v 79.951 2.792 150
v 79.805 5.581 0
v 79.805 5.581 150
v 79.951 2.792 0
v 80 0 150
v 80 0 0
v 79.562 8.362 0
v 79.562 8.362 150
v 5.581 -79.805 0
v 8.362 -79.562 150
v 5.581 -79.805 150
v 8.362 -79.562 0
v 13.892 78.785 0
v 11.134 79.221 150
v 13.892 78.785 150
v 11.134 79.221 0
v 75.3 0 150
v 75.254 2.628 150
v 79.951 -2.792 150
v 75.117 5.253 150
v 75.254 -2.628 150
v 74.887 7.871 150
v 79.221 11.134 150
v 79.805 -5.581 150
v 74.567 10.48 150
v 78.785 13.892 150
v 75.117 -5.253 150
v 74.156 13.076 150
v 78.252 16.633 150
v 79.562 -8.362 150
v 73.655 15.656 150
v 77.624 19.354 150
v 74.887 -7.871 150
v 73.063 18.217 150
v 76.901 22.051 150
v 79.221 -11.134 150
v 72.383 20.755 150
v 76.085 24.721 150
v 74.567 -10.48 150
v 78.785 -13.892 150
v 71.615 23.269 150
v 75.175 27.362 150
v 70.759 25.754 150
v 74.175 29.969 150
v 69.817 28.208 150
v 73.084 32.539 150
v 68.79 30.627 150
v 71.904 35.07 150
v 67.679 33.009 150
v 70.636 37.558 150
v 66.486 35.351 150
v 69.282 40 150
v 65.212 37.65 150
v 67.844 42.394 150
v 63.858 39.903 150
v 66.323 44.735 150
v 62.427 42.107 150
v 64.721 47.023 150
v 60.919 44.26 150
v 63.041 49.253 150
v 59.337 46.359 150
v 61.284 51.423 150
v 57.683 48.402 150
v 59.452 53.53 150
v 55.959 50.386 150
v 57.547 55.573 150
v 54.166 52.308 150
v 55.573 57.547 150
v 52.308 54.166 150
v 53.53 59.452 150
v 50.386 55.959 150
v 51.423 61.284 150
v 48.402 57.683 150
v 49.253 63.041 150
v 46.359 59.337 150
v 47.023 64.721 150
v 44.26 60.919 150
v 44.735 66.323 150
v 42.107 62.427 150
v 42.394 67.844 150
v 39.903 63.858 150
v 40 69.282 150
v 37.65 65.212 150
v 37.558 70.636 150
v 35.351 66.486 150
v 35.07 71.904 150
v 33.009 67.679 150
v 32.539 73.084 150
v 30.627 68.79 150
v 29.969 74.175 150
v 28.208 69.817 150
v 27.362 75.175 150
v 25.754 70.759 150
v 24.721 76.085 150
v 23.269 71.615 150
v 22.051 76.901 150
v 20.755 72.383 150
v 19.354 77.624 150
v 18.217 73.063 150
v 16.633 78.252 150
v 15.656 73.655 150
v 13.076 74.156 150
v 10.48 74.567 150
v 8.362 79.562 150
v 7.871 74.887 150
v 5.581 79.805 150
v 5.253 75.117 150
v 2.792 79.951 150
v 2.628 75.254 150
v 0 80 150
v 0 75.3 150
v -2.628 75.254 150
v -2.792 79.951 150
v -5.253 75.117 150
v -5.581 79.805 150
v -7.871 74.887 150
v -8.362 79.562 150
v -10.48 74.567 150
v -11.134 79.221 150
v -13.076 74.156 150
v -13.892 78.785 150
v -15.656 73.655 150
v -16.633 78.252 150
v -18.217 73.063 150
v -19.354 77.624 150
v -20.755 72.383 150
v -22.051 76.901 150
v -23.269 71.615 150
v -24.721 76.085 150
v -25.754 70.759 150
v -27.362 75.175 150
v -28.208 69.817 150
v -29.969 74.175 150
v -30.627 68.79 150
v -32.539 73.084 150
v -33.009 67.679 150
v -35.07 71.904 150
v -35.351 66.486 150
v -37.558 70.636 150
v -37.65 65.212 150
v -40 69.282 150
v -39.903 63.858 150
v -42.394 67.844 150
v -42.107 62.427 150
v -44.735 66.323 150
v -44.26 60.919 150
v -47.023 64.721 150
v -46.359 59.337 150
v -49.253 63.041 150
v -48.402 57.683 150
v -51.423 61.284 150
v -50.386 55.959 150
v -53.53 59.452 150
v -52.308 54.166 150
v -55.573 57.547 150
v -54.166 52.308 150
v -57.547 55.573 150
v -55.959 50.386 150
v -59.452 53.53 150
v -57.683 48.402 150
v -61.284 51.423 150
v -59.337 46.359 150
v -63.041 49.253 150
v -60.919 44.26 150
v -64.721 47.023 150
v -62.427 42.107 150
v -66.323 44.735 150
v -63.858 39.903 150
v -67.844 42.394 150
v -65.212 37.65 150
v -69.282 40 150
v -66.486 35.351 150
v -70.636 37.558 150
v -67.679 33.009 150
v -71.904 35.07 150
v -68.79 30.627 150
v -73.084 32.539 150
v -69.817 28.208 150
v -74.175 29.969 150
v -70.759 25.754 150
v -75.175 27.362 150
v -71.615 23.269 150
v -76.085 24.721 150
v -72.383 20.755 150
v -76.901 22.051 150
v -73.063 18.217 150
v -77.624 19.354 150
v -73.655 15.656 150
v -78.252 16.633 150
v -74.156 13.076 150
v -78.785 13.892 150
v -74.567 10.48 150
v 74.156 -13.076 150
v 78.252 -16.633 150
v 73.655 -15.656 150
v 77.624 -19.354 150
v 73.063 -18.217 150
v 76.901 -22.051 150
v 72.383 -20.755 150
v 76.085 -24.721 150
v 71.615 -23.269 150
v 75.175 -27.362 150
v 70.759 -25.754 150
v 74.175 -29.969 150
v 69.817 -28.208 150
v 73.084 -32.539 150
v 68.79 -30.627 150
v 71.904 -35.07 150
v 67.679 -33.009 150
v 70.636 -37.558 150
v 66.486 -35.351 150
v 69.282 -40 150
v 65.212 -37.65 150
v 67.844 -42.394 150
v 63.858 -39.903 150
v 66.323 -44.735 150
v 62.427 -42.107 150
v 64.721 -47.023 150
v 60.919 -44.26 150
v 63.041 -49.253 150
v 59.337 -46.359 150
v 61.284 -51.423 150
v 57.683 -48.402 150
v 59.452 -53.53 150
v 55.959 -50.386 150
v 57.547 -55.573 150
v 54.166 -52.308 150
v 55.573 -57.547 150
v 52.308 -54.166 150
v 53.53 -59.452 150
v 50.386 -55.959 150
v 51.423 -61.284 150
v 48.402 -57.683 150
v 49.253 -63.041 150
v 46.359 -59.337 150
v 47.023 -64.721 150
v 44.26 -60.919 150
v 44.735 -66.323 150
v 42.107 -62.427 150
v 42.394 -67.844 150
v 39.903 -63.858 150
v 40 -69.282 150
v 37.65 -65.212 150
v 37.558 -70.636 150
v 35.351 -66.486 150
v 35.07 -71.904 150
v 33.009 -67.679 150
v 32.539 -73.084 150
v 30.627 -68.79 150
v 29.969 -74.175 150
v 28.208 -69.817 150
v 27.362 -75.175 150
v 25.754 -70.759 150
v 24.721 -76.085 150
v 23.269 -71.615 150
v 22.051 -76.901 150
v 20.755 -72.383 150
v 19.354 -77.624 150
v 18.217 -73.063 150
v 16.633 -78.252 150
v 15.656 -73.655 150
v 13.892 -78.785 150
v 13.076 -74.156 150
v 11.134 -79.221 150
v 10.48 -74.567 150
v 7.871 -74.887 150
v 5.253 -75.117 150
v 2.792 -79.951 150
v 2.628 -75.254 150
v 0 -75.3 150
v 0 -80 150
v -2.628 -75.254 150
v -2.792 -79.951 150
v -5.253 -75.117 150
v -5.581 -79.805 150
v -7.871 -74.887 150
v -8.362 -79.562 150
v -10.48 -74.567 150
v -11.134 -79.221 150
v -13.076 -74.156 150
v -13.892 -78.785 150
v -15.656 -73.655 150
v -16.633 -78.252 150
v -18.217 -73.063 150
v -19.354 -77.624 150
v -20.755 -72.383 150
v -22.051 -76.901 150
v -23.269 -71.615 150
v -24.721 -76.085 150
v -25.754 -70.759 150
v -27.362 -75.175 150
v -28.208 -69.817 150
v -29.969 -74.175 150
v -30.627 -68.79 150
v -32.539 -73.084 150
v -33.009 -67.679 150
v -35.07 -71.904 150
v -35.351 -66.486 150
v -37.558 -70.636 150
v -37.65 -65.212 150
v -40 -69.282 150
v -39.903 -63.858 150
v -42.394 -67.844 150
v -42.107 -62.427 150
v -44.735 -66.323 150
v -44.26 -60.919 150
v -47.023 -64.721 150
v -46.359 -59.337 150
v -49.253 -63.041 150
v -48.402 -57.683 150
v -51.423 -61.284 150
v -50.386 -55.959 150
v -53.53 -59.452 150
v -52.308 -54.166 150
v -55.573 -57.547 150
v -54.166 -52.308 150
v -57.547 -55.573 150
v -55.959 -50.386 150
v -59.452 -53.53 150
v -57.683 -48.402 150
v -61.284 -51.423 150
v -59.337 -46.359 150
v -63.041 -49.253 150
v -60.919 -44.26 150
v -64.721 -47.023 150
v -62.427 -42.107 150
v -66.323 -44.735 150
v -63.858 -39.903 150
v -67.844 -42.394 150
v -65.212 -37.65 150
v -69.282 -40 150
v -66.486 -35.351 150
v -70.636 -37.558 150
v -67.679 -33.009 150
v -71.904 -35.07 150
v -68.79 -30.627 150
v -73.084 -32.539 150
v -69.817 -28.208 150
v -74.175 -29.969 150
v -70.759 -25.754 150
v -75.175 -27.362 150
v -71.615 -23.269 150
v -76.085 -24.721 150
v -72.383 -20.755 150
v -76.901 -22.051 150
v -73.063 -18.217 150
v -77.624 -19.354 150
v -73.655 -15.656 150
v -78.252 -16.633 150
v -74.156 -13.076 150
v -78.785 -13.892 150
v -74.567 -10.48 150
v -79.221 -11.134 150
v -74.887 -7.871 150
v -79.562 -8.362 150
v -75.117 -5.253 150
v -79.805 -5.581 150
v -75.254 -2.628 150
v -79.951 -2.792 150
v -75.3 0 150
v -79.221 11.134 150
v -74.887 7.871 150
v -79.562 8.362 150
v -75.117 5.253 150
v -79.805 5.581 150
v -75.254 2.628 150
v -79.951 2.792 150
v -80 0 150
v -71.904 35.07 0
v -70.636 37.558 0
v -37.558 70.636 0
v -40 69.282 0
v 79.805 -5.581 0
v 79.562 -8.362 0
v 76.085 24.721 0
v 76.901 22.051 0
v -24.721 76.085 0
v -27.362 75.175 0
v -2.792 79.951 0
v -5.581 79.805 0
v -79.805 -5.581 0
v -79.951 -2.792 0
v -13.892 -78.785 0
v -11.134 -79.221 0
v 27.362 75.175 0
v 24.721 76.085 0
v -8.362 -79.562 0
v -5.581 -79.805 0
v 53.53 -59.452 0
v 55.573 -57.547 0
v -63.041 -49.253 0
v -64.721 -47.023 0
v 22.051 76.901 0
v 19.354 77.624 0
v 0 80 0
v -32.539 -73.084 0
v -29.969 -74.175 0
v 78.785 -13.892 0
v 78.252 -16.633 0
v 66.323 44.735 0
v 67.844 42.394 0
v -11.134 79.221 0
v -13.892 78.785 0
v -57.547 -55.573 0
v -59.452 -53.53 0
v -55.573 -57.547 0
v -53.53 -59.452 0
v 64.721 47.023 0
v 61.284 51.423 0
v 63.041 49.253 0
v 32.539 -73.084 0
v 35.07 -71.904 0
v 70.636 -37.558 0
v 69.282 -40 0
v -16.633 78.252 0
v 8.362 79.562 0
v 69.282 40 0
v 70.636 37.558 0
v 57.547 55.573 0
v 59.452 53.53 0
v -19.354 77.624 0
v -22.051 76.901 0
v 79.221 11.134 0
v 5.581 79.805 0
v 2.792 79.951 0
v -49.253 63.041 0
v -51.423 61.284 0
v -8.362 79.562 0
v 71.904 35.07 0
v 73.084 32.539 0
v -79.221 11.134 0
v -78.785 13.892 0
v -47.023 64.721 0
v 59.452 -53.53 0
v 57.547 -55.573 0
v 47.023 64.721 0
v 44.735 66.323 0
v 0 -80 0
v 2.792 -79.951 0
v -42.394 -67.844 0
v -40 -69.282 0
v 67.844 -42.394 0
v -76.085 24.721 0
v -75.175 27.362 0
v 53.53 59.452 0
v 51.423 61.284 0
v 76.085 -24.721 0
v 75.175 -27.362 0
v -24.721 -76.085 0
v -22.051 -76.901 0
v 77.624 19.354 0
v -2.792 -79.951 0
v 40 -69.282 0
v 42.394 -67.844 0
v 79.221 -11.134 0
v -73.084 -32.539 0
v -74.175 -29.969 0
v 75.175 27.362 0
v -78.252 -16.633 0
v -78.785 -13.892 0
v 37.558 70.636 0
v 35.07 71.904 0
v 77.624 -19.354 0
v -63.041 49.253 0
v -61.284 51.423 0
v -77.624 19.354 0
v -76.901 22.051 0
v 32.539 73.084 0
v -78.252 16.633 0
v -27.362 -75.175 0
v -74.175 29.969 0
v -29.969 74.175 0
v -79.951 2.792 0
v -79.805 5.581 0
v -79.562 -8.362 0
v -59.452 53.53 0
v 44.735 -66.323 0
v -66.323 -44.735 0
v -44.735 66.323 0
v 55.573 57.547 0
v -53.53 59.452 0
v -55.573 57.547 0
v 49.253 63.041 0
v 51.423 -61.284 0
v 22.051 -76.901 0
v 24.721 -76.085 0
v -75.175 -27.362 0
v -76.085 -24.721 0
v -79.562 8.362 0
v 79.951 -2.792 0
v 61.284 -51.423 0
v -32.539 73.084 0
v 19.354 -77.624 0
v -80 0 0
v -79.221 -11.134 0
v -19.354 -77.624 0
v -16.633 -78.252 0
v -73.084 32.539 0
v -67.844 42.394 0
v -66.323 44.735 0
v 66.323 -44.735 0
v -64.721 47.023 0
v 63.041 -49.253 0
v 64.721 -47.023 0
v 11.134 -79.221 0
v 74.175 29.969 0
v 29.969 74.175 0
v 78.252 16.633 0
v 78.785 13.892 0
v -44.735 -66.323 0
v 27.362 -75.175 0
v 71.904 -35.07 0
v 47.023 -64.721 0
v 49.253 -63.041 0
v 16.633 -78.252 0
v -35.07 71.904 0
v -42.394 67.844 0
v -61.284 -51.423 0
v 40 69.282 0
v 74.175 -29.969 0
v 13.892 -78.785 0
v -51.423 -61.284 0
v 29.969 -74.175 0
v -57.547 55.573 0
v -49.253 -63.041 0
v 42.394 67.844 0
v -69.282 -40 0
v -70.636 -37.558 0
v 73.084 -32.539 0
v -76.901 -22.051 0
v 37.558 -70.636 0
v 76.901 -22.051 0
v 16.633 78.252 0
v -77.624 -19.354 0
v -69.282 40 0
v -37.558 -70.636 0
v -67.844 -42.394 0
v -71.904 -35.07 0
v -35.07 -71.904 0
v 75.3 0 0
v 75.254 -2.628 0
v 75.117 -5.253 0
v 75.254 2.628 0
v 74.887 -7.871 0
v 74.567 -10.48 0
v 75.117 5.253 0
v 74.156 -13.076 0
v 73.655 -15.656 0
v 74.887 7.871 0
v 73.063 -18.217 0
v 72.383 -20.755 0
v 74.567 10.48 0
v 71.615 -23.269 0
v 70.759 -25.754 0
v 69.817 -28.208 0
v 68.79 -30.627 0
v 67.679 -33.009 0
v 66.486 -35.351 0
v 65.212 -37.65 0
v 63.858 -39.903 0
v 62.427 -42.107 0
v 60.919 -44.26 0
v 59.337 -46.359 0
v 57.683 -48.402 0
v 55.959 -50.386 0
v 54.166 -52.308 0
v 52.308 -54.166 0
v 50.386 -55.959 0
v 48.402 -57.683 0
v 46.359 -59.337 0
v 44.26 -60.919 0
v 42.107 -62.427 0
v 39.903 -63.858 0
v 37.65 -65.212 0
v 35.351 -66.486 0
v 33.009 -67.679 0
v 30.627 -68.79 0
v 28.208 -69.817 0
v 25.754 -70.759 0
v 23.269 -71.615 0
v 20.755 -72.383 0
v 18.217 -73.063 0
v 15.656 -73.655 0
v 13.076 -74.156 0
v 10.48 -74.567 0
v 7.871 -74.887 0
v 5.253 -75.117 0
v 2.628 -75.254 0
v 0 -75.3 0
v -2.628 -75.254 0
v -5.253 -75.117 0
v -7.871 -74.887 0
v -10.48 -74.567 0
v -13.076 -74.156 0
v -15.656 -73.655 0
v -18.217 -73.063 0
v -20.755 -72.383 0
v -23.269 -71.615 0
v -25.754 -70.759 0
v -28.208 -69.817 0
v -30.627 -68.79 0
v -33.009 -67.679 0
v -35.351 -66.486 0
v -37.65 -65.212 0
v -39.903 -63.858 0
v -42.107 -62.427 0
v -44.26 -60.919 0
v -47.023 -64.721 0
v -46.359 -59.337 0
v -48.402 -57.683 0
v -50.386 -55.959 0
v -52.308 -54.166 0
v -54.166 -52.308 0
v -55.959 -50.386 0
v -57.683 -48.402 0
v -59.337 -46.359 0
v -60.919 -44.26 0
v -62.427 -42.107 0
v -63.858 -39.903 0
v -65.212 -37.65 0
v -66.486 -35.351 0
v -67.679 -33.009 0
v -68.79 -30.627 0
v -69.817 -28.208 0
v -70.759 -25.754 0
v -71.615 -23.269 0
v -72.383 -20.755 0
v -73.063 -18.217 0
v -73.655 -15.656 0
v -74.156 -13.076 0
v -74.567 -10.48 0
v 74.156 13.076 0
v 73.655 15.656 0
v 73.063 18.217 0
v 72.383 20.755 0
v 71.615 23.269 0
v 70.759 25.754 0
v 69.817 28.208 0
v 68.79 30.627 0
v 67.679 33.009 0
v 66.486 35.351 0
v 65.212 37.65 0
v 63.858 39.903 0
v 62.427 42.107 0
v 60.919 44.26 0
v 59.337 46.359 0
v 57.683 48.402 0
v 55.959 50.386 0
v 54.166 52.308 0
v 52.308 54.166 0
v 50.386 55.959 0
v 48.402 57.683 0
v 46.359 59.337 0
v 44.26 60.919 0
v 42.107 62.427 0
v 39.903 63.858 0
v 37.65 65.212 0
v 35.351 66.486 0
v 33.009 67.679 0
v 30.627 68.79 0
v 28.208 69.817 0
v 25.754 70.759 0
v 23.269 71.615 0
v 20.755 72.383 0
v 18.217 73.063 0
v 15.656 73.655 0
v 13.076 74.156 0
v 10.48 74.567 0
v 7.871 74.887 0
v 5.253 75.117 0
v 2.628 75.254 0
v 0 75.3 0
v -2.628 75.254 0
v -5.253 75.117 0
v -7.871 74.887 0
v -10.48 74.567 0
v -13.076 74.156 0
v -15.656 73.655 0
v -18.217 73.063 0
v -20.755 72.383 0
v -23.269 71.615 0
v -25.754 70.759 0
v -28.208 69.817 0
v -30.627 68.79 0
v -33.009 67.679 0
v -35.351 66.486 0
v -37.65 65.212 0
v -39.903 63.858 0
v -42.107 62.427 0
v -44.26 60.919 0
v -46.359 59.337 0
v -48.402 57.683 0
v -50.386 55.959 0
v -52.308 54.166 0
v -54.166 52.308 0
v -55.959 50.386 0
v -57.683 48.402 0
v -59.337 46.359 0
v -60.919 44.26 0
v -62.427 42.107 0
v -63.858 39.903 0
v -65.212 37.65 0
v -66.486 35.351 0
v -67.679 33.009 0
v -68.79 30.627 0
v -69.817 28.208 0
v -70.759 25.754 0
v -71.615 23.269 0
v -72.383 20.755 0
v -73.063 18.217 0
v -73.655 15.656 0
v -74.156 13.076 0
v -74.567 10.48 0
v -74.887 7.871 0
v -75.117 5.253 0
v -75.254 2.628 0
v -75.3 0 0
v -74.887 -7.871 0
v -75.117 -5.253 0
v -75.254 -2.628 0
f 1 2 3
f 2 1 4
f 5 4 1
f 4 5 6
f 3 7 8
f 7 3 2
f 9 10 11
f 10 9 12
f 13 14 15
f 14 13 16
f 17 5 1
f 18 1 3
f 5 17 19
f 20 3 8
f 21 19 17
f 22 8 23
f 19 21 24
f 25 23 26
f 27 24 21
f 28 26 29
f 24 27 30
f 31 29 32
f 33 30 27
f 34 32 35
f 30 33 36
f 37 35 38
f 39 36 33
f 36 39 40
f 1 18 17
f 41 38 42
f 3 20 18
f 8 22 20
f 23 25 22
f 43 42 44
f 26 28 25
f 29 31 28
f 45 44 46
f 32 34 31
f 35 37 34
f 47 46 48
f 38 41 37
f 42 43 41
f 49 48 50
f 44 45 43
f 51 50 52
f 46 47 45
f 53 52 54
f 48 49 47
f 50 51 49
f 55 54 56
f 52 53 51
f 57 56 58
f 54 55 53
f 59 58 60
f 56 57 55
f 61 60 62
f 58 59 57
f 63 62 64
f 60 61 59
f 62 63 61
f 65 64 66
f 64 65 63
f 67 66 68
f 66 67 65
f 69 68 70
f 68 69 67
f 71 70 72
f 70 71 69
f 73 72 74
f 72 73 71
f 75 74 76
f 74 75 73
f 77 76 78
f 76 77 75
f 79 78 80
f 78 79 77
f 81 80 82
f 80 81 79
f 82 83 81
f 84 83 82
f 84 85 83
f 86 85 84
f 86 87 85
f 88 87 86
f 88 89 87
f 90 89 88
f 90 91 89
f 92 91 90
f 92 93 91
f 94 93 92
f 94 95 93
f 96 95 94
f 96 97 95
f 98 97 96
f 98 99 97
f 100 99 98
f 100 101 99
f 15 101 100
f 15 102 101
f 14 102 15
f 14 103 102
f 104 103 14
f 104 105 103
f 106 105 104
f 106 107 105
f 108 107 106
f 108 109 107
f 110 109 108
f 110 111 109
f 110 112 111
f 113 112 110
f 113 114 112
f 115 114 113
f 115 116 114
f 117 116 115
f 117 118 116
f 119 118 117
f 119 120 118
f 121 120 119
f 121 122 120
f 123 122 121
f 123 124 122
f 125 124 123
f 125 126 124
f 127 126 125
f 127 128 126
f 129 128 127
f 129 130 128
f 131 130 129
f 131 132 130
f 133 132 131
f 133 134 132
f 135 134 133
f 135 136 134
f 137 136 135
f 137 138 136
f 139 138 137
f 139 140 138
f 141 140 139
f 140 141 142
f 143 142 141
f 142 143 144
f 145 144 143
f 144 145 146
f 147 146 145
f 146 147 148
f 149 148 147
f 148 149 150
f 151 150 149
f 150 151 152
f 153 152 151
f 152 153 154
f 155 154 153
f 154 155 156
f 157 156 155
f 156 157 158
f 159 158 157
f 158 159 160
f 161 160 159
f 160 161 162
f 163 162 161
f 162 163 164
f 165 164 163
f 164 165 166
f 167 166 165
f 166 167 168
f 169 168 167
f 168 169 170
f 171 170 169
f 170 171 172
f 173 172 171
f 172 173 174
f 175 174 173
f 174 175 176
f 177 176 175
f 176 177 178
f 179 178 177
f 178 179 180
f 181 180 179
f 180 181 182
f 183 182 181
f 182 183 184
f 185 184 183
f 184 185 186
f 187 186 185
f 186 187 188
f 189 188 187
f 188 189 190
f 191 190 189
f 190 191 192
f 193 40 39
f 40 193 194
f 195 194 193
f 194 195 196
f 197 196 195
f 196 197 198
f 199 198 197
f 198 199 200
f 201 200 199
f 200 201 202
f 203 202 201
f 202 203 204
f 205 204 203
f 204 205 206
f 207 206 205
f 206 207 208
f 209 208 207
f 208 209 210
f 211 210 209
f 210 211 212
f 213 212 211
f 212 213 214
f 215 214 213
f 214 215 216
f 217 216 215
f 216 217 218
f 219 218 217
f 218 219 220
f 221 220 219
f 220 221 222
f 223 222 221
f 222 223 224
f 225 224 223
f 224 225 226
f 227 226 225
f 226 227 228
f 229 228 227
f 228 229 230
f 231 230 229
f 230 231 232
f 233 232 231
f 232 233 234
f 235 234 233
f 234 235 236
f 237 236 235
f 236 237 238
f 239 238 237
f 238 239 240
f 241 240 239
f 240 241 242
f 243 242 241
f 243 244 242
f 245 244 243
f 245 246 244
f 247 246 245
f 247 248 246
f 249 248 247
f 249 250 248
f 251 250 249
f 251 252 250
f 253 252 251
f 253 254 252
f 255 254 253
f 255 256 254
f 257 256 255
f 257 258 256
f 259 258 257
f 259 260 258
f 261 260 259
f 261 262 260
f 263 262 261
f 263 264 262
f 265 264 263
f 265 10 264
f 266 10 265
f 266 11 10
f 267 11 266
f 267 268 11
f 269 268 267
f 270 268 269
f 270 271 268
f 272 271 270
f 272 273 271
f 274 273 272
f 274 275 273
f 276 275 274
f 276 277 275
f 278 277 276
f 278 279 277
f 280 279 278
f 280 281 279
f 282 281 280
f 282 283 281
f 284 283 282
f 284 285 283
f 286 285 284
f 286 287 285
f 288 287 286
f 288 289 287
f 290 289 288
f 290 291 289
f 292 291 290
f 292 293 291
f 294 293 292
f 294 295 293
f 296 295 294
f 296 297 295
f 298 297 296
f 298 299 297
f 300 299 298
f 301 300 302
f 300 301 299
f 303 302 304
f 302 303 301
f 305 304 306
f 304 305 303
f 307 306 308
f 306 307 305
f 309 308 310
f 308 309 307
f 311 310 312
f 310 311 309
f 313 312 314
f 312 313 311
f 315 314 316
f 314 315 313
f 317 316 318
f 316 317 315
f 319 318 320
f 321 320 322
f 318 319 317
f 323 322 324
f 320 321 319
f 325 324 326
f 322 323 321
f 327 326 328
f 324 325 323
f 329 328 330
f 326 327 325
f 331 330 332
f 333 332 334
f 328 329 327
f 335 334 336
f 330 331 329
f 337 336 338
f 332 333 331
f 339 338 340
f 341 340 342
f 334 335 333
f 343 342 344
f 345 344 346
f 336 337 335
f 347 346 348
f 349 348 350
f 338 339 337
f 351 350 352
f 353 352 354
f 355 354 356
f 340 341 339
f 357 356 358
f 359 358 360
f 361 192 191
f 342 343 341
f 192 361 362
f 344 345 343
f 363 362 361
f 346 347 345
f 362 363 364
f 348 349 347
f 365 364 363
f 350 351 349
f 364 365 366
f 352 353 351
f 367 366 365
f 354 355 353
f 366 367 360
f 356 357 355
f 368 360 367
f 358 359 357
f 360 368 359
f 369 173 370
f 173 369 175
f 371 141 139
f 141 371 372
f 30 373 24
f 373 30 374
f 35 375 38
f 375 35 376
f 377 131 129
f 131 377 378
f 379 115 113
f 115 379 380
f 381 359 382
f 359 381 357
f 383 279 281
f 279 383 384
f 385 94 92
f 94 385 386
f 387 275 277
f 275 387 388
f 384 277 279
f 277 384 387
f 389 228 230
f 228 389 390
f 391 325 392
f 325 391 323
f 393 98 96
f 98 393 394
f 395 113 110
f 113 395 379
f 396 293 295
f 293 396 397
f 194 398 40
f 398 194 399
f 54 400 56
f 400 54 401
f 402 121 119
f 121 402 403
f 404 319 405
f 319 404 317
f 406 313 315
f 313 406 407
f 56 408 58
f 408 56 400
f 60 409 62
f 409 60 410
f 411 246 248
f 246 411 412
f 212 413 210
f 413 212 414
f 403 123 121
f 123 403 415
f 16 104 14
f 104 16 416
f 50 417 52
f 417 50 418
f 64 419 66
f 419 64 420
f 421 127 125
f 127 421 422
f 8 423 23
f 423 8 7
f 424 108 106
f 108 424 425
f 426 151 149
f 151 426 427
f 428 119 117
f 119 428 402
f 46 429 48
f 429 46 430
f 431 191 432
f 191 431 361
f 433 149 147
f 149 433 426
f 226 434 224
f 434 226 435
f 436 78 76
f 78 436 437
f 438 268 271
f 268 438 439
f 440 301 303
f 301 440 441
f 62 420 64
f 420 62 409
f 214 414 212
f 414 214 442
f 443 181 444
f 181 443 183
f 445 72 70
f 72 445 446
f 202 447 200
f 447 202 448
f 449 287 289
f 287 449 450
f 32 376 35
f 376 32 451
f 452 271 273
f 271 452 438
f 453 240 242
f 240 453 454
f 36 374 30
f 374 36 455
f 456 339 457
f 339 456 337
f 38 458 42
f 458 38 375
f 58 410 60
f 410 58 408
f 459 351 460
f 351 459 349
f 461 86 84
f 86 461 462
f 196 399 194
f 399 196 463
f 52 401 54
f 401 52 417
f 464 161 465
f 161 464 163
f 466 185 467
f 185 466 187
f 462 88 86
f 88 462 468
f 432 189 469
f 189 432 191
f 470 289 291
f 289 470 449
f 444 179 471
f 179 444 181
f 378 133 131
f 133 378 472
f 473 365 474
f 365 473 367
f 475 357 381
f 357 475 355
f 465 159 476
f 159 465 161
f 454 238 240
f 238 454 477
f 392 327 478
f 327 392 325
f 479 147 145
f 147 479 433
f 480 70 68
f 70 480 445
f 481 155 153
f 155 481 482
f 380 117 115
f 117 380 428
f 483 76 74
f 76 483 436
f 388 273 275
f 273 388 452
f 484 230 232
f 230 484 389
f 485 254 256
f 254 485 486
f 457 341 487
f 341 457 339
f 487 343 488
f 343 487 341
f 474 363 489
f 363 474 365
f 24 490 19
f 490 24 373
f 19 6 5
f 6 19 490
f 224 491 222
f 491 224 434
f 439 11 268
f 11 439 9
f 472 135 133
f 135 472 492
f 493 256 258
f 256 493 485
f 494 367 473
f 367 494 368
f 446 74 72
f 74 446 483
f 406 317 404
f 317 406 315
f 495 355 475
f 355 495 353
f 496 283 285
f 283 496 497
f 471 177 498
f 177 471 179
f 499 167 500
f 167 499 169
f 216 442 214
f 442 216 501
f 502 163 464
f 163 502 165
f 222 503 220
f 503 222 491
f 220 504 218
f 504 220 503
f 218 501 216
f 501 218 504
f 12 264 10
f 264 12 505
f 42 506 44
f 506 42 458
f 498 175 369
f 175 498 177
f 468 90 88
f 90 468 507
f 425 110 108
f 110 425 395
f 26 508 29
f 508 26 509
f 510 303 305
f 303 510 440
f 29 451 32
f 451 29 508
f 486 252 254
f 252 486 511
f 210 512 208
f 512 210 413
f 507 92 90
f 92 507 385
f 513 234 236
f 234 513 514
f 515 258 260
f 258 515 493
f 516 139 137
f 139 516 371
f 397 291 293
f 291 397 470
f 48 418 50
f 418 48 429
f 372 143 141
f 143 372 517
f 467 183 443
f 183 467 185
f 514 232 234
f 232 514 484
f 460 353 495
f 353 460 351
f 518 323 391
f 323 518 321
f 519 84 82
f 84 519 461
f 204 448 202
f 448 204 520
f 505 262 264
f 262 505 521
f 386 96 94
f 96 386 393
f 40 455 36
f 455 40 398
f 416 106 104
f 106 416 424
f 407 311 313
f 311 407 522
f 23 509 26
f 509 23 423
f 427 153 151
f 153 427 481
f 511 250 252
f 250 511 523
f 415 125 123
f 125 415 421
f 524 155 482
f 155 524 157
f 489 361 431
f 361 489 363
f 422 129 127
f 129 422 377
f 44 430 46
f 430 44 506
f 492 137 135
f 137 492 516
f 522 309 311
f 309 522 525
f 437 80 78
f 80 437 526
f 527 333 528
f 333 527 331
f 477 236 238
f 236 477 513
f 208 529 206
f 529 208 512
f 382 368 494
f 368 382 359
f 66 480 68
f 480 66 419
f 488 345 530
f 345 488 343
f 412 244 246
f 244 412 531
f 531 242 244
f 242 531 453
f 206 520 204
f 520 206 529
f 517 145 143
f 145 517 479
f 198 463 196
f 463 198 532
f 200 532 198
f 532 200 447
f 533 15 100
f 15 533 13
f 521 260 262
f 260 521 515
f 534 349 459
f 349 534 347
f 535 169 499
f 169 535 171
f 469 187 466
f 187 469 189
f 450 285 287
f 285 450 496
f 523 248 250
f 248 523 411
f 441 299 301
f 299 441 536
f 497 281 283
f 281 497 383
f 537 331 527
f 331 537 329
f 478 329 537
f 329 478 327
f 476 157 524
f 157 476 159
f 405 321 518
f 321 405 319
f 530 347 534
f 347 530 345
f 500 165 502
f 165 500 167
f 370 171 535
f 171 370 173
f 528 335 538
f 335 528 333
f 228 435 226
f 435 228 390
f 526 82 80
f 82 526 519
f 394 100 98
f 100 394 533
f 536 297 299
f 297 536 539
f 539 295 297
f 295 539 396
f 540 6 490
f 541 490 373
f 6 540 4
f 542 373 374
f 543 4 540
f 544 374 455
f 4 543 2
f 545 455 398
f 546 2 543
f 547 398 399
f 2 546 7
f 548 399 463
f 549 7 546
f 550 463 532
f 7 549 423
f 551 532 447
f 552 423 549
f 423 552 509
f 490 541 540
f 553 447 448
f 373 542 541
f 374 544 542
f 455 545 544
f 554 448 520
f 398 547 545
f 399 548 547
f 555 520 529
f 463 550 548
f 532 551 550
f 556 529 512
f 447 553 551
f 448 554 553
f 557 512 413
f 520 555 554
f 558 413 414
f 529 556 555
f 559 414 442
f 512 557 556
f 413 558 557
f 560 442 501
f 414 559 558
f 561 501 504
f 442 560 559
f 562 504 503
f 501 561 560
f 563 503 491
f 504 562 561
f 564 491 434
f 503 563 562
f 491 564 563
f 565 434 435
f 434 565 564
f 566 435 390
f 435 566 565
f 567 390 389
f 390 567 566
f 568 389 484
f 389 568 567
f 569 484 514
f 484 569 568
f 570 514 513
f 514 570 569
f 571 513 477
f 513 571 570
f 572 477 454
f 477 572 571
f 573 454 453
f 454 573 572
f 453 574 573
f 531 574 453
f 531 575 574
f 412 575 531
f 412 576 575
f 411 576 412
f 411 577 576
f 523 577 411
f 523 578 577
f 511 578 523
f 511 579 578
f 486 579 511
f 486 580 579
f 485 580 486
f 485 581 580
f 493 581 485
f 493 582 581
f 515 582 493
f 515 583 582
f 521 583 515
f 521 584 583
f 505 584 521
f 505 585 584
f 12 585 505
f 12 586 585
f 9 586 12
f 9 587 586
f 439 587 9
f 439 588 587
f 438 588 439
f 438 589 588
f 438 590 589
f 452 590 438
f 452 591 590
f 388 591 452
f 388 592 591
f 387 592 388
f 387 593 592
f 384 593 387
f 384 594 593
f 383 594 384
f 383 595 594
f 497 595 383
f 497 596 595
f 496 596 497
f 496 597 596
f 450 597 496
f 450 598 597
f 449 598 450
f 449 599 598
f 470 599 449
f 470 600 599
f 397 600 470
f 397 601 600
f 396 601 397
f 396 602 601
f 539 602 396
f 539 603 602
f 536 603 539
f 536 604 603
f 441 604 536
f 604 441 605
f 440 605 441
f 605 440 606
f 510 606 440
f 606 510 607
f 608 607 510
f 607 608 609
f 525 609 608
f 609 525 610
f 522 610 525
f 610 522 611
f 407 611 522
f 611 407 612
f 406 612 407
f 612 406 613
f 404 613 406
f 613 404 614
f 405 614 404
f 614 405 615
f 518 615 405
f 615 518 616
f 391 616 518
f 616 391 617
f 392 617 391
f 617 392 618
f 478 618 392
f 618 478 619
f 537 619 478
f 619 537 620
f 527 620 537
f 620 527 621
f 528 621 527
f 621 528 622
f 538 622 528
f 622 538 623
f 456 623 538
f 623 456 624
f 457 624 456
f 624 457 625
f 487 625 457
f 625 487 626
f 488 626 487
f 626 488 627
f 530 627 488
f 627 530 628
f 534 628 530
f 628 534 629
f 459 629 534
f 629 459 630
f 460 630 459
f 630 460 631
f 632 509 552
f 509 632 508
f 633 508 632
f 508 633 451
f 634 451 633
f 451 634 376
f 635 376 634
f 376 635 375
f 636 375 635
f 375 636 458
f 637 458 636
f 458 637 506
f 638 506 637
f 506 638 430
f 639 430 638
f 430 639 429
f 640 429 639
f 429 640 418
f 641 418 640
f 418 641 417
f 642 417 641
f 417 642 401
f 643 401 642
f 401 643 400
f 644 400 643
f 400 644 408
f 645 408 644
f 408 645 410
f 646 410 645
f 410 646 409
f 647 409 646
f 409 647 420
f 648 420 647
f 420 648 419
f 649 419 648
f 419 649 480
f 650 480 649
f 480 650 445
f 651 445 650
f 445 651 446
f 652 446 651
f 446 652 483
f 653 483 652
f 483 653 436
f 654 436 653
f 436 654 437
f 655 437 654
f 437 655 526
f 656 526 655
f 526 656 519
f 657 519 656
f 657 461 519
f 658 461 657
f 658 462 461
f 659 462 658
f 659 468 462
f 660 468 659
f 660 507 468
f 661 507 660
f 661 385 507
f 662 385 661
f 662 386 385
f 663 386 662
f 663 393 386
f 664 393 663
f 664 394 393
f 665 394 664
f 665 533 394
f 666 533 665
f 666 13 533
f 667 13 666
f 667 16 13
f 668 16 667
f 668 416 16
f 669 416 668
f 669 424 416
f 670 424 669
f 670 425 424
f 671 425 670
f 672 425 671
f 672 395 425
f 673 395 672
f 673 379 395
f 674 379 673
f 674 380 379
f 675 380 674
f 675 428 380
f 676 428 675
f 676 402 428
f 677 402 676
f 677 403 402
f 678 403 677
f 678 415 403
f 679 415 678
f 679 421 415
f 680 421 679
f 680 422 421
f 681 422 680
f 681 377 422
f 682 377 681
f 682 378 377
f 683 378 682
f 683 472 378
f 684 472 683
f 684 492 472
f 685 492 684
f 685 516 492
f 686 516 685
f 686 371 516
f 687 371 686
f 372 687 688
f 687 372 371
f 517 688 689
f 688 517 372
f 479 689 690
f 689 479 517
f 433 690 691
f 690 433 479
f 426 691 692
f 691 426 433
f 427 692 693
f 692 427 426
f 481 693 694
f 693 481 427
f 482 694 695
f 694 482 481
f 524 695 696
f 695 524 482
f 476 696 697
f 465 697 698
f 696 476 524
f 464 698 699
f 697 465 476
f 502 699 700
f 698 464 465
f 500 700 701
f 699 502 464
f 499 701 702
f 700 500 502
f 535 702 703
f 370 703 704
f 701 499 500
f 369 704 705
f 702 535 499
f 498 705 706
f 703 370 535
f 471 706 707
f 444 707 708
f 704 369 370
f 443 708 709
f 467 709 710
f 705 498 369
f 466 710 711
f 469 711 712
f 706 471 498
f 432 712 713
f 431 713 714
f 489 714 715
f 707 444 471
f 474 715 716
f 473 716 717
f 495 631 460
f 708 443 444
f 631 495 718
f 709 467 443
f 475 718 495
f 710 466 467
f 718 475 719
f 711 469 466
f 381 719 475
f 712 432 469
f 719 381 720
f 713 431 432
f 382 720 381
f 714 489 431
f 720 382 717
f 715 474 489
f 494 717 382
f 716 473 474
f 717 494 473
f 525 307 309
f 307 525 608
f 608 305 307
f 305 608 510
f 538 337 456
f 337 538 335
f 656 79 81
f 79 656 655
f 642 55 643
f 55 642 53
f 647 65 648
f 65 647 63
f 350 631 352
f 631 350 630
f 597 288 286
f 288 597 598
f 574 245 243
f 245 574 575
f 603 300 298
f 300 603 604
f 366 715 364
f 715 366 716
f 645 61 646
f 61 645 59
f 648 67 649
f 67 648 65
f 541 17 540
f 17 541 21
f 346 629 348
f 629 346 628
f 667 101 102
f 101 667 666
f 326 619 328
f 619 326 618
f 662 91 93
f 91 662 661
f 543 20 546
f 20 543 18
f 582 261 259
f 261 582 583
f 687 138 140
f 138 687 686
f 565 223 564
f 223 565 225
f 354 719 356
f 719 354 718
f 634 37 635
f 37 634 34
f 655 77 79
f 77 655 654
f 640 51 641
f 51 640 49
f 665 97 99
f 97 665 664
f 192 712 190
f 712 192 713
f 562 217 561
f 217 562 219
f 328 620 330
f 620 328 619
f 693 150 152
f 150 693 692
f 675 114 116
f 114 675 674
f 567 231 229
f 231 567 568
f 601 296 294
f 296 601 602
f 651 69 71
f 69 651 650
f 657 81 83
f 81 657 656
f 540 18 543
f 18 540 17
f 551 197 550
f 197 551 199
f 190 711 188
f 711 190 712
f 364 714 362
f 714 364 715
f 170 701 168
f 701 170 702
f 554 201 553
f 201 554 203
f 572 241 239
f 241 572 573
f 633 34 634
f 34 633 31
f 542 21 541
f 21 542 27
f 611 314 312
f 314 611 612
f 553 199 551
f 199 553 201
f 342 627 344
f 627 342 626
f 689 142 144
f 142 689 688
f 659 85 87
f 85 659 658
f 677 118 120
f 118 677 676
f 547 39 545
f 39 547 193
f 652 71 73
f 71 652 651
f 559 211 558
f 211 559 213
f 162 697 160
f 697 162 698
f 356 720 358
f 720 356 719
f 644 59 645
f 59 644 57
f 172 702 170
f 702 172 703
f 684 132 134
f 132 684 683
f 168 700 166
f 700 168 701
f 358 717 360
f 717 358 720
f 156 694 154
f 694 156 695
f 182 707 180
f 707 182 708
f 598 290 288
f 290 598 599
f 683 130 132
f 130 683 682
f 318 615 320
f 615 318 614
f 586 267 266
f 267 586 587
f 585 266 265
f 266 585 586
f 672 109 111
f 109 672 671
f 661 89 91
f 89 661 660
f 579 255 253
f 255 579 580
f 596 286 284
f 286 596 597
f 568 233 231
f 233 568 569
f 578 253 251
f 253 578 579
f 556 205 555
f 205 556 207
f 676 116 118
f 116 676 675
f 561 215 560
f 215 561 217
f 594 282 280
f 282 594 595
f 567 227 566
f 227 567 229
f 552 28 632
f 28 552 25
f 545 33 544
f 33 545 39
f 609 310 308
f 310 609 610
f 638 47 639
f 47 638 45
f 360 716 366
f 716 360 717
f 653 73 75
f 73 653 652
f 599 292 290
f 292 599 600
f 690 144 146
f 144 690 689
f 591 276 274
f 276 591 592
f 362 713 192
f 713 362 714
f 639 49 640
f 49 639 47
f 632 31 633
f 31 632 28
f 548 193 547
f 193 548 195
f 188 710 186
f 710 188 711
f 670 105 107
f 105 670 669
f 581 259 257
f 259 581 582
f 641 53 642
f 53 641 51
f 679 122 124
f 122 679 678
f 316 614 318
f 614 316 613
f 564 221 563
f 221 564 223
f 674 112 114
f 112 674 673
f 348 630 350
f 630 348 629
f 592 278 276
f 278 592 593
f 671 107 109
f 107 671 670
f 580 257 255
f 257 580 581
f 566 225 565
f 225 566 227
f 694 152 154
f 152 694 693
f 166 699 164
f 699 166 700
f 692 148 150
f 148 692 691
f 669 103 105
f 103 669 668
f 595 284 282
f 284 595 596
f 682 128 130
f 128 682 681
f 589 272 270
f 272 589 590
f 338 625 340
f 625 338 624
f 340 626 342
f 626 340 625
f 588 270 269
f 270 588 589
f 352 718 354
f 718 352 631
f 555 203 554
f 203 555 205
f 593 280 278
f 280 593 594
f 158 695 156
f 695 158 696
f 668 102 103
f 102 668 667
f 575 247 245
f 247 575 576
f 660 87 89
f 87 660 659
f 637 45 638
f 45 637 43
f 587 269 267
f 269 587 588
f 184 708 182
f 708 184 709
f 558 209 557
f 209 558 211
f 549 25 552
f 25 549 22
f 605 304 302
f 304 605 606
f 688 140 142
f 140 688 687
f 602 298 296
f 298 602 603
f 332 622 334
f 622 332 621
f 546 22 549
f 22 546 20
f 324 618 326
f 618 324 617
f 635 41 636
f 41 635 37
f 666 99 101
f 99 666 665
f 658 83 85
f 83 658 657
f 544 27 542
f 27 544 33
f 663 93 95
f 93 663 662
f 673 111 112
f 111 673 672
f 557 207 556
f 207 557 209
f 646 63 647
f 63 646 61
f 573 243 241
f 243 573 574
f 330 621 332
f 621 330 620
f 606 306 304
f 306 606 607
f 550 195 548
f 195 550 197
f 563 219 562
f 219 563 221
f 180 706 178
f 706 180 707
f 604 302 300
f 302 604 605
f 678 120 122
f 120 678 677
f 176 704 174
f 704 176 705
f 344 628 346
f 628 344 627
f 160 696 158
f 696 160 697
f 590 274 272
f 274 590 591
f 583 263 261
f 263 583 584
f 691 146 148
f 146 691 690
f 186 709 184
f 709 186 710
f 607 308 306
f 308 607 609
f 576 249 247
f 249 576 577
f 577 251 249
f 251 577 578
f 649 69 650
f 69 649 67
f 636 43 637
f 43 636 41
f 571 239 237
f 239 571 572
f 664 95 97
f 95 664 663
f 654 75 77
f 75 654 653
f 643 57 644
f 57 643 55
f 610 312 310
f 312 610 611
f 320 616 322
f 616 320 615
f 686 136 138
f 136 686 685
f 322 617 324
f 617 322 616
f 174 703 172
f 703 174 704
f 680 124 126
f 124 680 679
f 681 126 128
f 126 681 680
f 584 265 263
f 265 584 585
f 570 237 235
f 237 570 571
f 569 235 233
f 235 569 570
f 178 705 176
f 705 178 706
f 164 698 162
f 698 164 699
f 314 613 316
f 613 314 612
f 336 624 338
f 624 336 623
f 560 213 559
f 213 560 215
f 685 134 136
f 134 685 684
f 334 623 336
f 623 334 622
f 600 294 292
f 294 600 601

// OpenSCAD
$fn = 180;

// HT pipe parameters (approximation)
outer_d = 160;      // mm (nominal HT 160 outer diameter)
length  = 150;      // mm
wall    = 4.7;      // mm (typical-ish for HT 160; adjust if needed)

inner_d = outer_d - 2*wall;

difference() {
    cylinder(h = length, d = outer_d, center = false);
    translate([0,0,-0.1])
        cylinder(h = length + 0.2, d = inner_d, center = false);
}
